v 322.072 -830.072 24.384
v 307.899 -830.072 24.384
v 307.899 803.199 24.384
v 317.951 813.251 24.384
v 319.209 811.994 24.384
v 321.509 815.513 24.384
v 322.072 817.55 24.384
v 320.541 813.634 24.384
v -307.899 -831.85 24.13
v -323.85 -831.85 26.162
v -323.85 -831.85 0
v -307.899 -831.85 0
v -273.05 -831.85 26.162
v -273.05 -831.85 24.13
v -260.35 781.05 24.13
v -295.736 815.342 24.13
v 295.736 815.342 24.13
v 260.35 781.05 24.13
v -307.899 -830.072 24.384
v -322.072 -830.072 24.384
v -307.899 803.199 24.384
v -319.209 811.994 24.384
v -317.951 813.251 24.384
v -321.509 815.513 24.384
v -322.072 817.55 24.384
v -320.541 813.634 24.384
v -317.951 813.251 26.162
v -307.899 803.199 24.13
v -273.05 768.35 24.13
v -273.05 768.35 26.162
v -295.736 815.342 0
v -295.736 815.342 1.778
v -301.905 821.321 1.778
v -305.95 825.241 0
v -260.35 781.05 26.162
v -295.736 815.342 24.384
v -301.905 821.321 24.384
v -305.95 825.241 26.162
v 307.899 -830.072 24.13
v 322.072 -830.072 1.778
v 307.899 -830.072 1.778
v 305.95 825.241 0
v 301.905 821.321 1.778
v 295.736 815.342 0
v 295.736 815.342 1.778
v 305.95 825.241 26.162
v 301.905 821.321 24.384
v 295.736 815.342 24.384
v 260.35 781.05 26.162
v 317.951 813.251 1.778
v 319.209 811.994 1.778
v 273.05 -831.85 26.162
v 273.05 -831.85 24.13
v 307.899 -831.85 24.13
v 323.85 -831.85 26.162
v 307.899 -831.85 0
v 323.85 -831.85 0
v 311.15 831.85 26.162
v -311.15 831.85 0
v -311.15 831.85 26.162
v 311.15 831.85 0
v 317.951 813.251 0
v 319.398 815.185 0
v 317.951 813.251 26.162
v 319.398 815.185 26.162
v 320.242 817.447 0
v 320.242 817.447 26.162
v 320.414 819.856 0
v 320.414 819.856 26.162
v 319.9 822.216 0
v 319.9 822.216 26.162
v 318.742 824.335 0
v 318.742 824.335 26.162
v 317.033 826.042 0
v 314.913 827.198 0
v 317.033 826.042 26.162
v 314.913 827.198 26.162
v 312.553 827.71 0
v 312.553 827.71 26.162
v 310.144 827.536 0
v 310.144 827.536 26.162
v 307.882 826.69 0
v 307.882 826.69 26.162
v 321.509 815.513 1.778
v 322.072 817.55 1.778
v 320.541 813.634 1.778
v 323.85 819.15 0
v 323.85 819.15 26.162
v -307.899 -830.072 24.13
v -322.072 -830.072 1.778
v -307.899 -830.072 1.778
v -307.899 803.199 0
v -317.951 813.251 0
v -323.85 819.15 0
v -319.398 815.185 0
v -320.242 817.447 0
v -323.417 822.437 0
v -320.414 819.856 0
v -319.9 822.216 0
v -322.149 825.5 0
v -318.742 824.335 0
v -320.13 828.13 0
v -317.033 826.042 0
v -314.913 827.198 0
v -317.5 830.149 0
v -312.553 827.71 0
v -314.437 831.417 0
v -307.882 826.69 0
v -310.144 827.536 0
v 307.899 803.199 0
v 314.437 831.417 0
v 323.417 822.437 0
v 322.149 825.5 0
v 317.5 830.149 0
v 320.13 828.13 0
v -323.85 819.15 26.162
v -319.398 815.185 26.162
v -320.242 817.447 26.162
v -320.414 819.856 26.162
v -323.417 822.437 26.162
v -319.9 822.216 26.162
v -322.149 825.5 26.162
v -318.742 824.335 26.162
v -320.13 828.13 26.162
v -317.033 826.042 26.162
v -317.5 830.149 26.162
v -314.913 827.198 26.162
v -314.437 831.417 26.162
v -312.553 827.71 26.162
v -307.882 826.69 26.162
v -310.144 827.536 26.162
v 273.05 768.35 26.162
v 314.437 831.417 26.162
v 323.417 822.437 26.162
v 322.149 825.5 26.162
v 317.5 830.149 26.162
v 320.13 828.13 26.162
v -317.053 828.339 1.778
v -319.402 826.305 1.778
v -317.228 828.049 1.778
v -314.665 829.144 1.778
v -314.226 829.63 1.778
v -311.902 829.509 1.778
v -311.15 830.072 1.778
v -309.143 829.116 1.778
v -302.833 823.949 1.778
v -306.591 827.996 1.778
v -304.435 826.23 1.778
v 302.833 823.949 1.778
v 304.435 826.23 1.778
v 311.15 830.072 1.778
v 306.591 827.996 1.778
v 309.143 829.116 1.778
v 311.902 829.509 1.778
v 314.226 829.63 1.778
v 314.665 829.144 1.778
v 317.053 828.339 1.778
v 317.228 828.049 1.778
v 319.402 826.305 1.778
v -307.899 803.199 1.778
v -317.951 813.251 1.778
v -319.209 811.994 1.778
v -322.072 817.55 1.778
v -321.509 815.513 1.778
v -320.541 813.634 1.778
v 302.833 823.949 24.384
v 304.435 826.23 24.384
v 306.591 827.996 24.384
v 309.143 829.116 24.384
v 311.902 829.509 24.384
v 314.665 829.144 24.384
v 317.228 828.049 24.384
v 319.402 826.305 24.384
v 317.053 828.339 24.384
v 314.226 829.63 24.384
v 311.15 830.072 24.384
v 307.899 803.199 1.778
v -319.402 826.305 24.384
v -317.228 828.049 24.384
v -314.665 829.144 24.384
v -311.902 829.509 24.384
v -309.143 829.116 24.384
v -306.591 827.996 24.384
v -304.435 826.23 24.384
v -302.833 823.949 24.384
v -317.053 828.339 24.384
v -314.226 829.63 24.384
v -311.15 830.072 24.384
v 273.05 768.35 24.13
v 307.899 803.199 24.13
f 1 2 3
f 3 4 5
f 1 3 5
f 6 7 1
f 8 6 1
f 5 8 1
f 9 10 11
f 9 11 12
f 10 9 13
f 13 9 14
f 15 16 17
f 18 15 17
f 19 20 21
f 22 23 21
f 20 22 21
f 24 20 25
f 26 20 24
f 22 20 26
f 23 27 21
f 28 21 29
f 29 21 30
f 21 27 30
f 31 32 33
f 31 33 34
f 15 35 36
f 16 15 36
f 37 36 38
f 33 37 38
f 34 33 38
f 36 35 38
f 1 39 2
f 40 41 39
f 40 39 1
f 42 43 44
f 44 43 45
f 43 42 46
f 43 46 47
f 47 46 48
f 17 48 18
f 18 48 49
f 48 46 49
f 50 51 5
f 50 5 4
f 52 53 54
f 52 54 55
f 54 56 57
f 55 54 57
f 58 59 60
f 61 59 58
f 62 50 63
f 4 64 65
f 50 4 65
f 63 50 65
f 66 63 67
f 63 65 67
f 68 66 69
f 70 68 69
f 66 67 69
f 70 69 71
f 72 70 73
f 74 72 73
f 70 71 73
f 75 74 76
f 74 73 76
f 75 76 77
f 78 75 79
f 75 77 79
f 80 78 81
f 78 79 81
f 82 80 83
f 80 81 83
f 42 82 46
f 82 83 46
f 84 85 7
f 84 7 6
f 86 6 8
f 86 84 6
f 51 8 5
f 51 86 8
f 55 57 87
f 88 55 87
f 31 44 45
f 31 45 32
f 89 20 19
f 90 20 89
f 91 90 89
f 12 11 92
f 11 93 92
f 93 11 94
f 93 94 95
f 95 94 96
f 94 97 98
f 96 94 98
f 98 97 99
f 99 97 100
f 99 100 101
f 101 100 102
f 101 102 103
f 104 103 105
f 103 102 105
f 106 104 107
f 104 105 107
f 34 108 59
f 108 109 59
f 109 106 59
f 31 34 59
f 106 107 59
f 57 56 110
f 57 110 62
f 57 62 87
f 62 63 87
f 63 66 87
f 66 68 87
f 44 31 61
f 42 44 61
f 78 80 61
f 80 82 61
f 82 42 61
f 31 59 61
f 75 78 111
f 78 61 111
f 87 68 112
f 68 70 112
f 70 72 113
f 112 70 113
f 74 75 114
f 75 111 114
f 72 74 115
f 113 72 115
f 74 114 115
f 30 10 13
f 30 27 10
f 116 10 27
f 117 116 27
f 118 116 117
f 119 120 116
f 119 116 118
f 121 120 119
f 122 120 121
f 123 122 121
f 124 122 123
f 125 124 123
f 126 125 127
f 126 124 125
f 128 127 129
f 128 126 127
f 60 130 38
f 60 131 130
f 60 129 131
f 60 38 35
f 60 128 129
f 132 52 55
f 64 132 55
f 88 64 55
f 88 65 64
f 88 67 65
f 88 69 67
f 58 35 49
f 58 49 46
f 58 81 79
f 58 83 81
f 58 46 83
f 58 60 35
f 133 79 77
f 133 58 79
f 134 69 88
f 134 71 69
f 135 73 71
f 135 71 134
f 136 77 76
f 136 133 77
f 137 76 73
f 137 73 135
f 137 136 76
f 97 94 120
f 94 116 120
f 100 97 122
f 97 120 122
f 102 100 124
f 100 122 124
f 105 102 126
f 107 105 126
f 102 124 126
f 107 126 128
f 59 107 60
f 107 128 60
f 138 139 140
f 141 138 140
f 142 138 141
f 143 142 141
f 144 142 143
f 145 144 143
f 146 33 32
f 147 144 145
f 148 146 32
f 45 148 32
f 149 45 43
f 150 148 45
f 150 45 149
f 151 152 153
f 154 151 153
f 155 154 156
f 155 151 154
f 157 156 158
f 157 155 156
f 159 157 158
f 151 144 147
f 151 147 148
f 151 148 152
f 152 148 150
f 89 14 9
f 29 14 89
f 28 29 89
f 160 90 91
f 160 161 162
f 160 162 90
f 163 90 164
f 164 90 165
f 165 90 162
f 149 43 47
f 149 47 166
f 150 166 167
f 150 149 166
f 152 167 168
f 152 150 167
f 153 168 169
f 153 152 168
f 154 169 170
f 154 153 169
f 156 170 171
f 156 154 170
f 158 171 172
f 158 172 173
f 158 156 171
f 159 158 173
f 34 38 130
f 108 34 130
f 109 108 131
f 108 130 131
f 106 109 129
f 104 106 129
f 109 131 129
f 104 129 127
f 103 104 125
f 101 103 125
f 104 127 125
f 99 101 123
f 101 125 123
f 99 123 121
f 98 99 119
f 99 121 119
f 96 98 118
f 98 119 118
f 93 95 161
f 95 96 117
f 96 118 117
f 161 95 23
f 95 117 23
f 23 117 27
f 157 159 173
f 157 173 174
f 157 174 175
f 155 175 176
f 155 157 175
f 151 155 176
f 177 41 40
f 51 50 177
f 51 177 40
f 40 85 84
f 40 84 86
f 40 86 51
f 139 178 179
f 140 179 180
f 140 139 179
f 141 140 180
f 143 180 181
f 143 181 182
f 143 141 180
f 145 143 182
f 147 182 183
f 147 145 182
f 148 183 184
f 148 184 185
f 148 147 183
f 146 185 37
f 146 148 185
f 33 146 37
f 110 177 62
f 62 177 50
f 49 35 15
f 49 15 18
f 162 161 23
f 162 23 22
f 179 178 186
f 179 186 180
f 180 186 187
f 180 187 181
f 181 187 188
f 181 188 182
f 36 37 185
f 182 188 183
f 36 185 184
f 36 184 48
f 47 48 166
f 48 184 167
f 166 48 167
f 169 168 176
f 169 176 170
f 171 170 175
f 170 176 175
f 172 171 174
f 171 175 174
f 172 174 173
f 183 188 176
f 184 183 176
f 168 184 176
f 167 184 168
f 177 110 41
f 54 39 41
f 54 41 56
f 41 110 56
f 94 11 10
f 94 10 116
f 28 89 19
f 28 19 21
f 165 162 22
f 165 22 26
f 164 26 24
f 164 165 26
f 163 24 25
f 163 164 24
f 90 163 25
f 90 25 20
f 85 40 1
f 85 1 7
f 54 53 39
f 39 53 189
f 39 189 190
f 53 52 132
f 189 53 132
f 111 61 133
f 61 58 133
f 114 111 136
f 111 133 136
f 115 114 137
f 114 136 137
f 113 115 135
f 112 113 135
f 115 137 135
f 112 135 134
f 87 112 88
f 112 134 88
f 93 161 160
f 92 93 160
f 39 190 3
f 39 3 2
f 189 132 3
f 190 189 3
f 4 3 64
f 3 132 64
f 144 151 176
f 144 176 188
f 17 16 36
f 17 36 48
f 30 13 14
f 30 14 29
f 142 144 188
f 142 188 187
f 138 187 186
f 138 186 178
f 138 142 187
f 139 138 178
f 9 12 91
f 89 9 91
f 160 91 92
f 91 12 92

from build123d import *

# Parameters (mm, degrees)
SKETCH1_W           = 647.7
SKETCH1_H           = 1663.7
BOSS_EXTRUDE1_DEPTH = 26.162
SKETCH2_W           = 546.1
SKETCH2_H           = 1612.9
CUT_EXTRUDE1_DEPTH  = 26.162
CUT_EXTRUDE2_DEPTH  = 26.162
CUT_EXTRUDE3_DEPTH  = 24.13
FILLET1_R           = 12.7
SHELL4_START        = 1.778
SHELL4_DEPTH        = 22.606


# Read off the part's stored shape, not the designer's step: Shell4
with BuildPart() as part:
    # Sketch1 → Boss-Extrude1 (new body)
    with BuildSketch(Plane.XY):
        Rectangle(SKETCH1_W, SKETCH1_H)
    extrude(amount=BOSS_EXTRUDE1_DEPTH)

    # Sketch2 → Cut-Extrude1 (cut)
    with BuildSketch(Plane.XY.offset(26.162)):
        with Locations((0, -25.4)):
            Rectangle(SKETCH2_W, SKETCH2_H)
    extrude(amount=-CUT_EXTRUDE1_DEPTH, mode=Mode.SUBTRACT)

    # Sketch3 → Cut-Extrude2 (cut)
    with BuildSketch(Plane.XY.offset(26.162)):
        with BuildLine():
            Line((-317.951280605, 813.251280605), (-273.05, 768.35))
            Line((-273.05, 768.35), (-273.05, 781.05))
            Line((-273.05, 781.05), (-260.35, 781.05))
            Line((-260.35, 781.05), (-305.950453026, 825.241047594))
            ThreePointArc((-305.950453026, 825.241047594), (-317.94851482, 825.249344949), (-317.951280605, 813.251280605))
        make_face()
        with BuildLine():
            Line((305.950453026, 825.241047594), (260.35, 781.05))
            Line((260.35, 781.05), (273.05, 781.05))
            Line((273.05, 781.05), (273.05, 768.35))
            Line((273.05, 768.35), (317.951280605, 813.251280605))
            ThreePointArc((317.951280605, 813.251280605), (317.94851482, 825.249344949), (305.950453026, 825.241047594))
        make_face()
    extrude(amount=-CUT_EXTRUDE2_DEPTH, mode=Mode.SUBTRACT)

    # Sketch4 → Cut-Extrude3 (cut)
    with BuildSketch(Plane(origin=(0, 0, 0), x_dir=(-1, 0, 0), z_dir=(0, 0, -1))):
        Polygon((-307.8988, 768.35), (-307.8988, 803.1988), (-273.05, 768.35), (-273.05, -831.85), (-307.8988, -831.85), align=None)
        Polygon((-260.35, 781.05), (-295.735951532, 815.342252918), (295.735951532, 815.342252918), (260.35, 781.05), align=None)
        Polygon((307.8988, 803.1988), (273.05, 768.35), (273.05, -831.85), (307.8988, -831.85), (307.8988, 768.35), align=None)
    extrude(amount=-CUT_EXTRUDE3_DEPTH, mode=Mode.SUBTRACT)

    # Fillet1
    fillet1_edges = [part.edges().sort_by_distance(p)[0] for p in [
        (-323.85, 831.85, 13.081),
        (323.85, 831.85, 13.081),
    ]]
    fillet(fillet1_edges, radius=FILLET1_R)

    # Shell4 outline → Shell4 (cut)
    with BuildSketch(Plane.XY.offset(SHELL4_START)):
        with BuildLine():
            Line((307.8988, 803.1988), (307.8988, -830.072))
            Line((307.8988, -830.072), (322.072, -830.072))
            Line((322.072, -830.072), (322.072, 817.550302353))
            ThreePointArc((322.072, 817.550302353), (321.07369087, 814.548798877), (319.208516462, 811.994044748))
            Line((319.208516462, 811.994044748), (317.951280605, 813.251280605))
            Line((317.951280605, 813.251280605), (307.8988, 803.1988))
        make_face()
        with BuildLine():
            Line((-322.072, -830.072), (-307.8988, -830.072))
            Line((-307.8988, -830.072), (-307.8988, 803.1988))
            Line((-307.8988, 803.1988), (-317.951280605, 813.251280605))
            Line((-317.951280605, 813.251280605), (-319.208516462, 811.994044748))
            ThreePointArc((-319.208516462, 811.994044748), (-321.07369087, 814.548798877), (-322.072, 817.550302353))
            Line((-322.072, 817.550302353), (-322.072, -830.072))
        make_face()
        with BuildLine():
            ThreePointArc((301.905011396, 821.320641288), (309.142763578, 829.116339567), (319.402097182, 826.304926702))
            ThreePointArc((319.402097182, 826.304926702), (315.685635268, 829.085698099), (311.15, 830.072))
            Line((311.15, 830.072), (-311.15, 830.072))
            ThreePointArc((-311.15, 830.072), (-315.685635267, 829.085698099), (-319.402097181, 826.304926702))
            ThreePointArc((-319.402097181, 826.304926702), (-309.142763577, 829.116339567), (-301.905011396, 821.320641288))
            Line((-301.905011396, 821.320641288), (-295.735951532, 815.342252918))
            Line((-295.735951532, 815.342252918), (295.735951532, 815.342252918))
            Line((295.735951532, 815.342252918), (301.905011396, 821.320641288))
        make_face()
    extrude(amount=SHELL4_DEPTH, mode=Mode.SUBTRACT)


solid = part.part
